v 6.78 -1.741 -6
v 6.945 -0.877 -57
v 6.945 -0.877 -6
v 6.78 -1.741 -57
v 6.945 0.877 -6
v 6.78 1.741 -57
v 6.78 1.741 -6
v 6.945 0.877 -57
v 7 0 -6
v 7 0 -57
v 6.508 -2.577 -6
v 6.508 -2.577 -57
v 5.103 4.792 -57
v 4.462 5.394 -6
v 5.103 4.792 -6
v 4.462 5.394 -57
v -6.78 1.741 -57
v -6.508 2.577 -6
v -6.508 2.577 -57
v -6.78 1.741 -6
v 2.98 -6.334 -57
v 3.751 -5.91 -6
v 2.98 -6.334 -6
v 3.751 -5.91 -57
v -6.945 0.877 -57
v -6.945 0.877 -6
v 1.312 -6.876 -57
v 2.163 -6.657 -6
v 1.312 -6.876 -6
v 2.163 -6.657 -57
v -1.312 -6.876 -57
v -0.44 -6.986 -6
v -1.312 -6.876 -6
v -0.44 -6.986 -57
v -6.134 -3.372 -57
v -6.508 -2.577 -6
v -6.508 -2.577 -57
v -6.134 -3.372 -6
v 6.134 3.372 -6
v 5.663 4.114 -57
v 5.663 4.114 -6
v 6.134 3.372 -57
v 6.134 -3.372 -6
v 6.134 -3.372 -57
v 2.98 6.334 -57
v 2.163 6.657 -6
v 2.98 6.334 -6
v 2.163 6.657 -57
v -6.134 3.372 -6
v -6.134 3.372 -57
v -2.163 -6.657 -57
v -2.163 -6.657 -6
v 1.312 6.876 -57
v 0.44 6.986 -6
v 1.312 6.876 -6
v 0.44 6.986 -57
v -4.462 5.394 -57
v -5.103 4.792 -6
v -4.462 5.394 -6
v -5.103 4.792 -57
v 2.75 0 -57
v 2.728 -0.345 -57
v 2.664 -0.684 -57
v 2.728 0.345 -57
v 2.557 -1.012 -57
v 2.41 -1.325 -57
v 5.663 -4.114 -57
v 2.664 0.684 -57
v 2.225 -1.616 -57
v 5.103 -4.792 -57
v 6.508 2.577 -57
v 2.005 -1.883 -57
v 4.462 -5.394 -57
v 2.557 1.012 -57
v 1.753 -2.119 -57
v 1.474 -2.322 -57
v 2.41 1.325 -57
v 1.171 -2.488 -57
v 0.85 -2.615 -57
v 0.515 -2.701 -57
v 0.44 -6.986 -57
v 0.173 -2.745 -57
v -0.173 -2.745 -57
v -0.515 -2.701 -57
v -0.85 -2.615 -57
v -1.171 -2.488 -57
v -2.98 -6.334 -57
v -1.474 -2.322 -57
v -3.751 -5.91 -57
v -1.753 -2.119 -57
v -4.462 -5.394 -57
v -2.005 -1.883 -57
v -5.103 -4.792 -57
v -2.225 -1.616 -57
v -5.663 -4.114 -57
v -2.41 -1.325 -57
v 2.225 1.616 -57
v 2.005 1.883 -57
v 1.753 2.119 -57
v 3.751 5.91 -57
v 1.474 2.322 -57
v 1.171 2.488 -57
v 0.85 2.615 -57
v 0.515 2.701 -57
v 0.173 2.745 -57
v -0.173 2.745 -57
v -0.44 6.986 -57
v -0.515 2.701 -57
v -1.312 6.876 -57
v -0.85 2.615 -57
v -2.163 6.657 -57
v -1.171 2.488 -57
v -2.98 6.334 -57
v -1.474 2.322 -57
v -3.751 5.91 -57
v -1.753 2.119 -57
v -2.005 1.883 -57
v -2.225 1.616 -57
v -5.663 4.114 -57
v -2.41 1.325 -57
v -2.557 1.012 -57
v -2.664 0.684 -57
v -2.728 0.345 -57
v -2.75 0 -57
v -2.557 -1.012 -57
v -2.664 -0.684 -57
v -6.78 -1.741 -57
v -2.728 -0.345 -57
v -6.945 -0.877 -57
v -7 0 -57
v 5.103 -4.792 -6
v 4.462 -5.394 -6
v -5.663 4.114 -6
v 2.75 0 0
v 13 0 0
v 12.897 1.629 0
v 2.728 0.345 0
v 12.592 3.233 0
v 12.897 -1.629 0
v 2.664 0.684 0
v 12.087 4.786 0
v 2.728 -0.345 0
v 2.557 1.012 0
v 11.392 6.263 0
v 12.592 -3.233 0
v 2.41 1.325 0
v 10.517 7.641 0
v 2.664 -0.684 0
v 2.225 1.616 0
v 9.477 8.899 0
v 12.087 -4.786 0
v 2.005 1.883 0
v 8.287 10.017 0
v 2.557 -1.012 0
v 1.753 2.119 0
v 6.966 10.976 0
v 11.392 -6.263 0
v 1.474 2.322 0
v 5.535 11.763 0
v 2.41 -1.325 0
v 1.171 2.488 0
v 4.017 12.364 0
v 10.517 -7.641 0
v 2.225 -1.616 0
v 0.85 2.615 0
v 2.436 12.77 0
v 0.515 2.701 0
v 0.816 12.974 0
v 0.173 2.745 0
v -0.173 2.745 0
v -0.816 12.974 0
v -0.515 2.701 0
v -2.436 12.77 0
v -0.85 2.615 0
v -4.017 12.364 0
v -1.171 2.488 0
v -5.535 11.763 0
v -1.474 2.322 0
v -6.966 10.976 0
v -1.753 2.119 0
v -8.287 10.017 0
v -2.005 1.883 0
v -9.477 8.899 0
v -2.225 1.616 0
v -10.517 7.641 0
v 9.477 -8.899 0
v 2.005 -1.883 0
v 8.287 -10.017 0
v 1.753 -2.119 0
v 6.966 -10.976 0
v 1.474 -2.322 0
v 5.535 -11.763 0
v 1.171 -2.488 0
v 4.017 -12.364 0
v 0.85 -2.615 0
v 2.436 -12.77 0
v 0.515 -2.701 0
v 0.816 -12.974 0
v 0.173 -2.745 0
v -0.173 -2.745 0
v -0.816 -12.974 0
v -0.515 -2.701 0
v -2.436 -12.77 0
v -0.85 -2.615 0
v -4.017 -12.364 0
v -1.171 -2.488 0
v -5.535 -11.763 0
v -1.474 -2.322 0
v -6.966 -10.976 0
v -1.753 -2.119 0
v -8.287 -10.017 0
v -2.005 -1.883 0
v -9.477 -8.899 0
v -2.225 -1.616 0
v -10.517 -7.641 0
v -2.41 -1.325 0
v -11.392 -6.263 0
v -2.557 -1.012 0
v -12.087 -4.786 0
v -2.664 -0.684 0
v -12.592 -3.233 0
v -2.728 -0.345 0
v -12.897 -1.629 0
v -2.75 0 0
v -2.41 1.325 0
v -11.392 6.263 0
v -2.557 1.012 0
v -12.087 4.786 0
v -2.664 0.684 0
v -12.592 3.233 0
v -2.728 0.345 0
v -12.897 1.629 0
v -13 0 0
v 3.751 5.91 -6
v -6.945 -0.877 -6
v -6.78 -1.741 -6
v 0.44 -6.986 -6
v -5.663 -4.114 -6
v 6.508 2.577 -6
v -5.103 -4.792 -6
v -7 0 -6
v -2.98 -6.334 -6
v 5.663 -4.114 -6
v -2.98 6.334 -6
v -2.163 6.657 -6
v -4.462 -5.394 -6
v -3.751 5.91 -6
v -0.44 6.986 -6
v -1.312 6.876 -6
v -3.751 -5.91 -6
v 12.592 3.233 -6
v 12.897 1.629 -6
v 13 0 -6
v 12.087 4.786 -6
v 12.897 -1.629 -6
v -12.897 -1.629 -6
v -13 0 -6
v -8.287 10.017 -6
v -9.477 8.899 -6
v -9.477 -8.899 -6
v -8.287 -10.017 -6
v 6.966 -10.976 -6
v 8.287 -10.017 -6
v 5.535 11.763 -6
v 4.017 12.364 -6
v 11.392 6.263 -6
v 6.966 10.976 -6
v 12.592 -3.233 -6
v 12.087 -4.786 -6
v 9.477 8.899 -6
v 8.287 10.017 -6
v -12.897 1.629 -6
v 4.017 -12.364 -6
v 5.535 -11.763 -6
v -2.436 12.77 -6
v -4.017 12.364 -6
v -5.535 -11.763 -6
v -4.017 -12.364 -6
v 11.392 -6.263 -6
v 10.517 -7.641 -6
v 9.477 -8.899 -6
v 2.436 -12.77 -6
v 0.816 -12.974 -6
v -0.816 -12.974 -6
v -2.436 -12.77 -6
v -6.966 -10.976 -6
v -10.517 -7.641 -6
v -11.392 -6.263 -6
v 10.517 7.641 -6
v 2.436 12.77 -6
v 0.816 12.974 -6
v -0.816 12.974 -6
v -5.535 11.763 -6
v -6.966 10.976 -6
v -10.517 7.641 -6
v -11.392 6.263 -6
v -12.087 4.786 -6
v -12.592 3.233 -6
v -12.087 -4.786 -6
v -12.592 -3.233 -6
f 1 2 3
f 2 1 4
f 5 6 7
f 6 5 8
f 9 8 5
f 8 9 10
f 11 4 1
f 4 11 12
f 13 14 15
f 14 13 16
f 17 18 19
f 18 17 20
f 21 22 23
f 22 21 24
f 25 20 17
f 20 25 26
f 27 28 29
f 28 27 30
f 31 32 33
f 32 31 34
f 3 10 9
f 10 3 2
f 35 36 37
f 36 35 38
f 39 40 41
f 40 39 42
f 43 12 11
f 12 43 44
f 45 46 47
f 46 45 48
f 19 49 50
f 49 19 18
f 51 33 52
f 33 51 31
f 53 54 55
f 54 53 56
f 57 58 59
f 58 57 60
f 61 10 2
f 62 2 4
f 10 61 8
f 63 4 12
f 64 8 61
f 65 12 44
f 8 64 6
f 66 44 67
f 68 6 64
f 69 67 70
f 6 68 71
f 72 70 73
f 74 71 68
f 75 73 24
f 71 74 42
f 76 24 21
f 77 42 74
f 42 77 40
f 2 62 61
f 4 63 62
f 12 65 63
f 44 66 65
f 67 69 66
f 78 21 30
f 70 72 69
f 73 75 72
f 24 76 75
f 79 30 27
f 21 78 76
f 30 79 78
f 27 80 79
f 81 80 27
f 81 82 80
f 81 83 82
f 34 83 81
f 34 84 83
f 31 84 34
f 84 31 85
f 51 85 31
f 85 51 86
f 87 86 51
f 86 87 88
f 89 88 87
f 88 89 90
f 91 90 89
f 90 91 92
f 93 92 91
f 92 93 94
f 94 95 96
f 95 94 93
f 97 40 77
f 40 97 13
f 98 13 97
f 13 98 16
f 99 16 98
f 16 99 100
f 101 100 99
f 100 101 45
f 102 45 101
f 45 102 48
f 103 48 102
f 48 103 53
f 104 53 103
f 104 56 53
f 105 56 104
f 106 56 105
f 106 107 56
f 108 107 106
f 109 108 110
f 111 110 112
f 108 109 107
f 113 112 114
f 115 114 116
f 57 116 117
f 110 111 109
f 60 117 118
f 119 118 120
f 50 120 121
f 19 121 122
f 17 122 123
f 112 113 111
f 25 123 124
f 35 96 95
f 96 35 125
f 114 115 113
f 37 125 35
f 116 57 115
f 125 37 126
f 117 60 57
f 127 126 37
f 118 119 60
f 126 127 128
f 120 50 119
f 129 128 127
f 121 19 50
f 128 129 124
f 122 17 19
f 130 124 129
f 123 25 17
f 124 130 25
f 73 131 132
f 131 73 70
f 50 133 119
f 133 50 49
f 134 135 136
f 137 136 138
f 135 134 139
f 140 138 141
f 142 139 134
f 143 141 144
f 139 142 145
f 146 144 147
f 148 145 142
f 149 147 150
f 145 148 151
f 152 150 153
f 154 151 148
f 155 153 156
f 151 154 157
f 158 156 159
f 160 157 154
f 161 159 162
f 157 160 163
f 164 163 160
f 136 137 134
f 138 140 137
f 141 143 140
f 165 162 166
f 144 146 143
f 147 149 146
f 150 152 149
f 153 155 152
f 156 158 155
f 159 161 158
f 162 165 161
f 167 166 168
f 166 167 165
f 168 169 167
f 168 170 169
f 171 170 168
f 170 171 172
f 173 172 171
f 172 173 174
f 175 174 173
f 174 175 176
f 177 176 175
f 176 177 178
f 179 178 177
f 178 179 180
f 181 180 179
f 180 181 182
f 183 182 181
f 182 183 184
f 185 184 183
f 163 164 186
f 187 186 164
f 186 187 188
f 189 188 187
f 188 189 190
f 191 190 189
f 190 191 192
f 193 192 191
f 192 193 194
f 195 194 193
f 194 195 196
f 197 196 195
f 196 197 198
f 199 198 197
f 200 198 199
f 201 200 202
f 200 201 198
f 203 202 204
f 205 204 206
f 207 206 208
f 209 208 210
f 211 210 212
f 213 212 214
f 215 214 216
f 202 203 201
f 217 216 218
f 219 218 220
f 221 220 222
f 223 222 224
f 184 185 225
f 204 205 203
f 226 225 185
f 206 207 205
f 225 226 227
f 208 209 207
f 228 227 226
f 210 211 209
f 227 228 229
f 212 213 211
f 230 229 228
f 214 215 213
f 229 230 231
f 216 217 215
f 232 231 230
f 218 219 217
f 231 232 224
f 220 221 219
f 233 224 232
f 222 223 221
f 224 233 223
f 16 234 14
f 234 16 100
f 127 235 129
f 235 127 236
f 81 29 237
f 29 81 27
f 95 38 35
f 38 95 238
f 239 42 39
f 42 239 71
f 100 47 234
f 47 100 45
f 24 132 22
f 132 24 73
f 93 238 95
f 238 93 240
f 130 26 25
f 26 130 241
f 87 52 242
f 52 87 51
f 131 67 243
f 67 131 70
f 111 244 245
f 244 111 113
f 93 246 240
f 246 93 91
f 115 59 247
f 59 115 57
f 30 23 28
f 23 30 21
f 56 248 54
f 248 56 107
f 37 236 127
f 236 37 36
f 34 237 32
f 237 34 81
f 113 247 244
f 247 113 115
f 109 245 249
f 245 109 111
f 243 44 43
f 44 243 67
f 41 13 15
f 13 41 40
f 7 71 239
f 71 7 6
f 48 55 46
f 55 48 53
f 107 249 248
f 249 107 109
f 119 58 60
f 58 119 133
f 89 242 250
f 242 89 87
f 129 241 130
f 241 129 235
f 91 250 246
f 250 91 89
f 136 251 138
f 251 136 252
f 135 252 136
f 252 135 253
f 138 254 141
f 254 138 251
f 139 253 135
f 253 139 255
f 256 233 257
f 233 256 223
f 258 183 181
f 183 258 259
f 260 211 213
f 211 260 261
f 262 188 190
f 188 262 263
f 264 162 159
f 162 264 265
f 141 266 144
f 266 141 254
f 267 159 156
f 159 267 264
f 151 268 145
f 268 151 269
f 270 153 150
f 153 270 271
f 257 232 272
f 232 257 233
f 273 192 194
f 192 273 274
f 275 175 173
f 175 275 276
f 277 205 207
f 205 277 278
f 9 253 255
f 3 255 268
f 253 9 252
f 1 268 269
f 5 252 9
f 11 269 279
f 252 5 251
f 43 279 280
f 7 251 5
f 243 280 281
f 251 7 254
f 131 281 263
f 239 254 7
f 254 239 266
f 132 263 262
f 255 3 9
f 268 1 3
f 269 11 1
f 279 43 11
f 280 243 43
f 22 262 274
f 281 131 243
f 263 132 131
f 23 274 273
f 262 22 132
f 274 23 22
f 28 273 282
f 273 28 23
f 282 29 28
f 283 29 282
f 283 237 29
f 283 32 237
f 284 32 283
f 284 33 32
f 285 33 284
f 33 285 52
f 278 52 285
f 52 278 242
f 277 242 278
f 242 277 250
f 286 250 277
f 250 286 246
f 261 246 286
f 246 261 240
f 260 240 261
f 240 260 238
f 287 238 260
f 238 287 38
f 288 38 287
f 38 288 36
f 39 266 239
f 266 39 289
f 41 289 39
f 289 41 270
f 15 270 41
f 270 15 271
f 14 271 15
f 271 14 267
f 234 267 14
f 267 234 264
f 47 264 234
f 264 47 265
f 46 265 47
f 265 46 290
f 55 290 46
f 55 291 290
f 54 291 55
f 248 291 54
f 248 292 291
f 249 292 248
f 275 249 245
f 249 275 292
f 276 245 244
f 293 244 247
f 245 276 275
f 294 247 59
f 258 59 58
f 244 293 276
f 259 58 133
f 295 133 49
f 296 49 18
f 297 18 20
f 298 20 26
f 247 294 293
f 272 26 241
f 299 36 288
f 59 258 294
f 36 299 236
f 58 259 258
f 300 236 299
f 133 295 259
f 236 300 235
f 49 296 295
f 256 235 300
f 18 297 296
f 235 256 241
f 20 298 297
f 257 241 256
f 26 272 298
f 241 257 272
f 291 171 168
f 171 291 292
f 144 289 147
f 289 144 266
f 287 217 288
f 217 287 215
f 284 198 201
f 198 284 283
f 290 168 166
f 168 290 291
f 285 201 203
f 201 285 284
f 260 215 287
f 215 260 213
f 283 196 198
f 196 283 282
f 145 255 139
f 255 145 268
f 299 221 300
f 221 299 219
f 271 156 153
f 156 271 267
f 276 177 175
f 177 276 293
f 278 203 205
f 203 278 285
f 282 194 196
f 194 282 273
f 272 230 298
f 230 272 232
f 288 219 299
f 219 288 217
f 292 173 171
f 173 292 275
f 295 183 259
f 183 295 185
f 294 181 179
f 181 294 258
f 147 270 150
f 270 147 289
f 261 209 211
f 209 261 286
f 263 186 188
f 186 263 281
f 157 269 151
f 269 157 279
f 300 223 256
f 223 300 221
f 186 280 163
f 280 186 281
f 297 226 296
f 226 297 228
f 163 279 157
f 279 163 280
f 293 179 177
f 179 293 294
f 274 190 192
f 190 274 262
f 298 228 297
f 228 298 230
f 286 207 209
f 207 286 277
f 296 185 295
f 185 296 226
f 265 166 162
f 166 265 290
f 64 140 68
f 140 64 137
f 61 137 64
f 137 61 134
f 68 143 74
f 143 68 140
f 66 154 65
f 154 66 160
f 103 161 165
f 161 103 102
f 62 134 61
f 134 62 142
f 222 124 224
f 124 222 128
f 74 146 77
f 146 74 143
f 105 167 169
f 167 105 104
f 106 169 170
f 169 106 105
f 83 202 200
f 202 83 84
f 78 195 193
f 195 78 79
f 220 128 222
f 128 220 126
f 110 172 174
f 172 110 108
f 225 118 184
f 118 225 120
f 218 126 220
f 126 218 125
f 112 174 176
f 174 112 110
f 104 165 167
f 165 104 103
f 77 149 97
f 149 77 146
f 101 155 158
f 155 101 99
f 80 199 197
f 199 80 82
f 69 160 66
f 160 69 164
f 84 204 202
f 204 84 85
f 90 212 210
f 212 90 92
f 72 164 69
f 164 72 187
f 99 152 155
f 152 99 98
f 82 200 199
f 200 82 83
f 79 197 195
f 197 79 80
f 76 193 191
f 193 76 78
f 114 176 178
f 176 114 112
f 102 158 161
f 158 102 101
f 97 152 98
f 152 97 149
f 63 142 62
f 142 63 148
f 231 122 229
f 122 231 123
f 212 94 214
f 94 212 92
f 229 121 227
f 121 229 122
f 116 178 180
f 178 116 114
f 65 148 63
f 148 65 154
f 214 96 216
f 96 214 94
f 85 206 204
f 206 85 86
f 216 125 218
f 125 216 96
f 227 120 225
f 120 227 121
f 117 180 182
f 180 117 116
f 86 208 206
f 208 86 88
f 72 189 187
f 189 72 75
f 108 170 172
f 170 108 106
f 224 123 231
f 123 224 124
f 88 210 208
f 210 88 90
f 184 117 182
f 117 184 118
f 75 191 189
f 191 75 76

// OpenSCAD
$fn = 50;


difference() {
	union() {
		translate(v = [0, 0, -57.0000000000]) {
			cylinder(h = 57, r = 7.0000000000);
		}
		translate(v = [0, 0, -6.0000000000]) {
			cylinder(h = 6, r = 13.0000000000);
		}
	}
	union() {
		#translate(v = [0, 0, -57]) {
			cylinder(h = 57, r = 2.7500000000);
		}
	}
}
